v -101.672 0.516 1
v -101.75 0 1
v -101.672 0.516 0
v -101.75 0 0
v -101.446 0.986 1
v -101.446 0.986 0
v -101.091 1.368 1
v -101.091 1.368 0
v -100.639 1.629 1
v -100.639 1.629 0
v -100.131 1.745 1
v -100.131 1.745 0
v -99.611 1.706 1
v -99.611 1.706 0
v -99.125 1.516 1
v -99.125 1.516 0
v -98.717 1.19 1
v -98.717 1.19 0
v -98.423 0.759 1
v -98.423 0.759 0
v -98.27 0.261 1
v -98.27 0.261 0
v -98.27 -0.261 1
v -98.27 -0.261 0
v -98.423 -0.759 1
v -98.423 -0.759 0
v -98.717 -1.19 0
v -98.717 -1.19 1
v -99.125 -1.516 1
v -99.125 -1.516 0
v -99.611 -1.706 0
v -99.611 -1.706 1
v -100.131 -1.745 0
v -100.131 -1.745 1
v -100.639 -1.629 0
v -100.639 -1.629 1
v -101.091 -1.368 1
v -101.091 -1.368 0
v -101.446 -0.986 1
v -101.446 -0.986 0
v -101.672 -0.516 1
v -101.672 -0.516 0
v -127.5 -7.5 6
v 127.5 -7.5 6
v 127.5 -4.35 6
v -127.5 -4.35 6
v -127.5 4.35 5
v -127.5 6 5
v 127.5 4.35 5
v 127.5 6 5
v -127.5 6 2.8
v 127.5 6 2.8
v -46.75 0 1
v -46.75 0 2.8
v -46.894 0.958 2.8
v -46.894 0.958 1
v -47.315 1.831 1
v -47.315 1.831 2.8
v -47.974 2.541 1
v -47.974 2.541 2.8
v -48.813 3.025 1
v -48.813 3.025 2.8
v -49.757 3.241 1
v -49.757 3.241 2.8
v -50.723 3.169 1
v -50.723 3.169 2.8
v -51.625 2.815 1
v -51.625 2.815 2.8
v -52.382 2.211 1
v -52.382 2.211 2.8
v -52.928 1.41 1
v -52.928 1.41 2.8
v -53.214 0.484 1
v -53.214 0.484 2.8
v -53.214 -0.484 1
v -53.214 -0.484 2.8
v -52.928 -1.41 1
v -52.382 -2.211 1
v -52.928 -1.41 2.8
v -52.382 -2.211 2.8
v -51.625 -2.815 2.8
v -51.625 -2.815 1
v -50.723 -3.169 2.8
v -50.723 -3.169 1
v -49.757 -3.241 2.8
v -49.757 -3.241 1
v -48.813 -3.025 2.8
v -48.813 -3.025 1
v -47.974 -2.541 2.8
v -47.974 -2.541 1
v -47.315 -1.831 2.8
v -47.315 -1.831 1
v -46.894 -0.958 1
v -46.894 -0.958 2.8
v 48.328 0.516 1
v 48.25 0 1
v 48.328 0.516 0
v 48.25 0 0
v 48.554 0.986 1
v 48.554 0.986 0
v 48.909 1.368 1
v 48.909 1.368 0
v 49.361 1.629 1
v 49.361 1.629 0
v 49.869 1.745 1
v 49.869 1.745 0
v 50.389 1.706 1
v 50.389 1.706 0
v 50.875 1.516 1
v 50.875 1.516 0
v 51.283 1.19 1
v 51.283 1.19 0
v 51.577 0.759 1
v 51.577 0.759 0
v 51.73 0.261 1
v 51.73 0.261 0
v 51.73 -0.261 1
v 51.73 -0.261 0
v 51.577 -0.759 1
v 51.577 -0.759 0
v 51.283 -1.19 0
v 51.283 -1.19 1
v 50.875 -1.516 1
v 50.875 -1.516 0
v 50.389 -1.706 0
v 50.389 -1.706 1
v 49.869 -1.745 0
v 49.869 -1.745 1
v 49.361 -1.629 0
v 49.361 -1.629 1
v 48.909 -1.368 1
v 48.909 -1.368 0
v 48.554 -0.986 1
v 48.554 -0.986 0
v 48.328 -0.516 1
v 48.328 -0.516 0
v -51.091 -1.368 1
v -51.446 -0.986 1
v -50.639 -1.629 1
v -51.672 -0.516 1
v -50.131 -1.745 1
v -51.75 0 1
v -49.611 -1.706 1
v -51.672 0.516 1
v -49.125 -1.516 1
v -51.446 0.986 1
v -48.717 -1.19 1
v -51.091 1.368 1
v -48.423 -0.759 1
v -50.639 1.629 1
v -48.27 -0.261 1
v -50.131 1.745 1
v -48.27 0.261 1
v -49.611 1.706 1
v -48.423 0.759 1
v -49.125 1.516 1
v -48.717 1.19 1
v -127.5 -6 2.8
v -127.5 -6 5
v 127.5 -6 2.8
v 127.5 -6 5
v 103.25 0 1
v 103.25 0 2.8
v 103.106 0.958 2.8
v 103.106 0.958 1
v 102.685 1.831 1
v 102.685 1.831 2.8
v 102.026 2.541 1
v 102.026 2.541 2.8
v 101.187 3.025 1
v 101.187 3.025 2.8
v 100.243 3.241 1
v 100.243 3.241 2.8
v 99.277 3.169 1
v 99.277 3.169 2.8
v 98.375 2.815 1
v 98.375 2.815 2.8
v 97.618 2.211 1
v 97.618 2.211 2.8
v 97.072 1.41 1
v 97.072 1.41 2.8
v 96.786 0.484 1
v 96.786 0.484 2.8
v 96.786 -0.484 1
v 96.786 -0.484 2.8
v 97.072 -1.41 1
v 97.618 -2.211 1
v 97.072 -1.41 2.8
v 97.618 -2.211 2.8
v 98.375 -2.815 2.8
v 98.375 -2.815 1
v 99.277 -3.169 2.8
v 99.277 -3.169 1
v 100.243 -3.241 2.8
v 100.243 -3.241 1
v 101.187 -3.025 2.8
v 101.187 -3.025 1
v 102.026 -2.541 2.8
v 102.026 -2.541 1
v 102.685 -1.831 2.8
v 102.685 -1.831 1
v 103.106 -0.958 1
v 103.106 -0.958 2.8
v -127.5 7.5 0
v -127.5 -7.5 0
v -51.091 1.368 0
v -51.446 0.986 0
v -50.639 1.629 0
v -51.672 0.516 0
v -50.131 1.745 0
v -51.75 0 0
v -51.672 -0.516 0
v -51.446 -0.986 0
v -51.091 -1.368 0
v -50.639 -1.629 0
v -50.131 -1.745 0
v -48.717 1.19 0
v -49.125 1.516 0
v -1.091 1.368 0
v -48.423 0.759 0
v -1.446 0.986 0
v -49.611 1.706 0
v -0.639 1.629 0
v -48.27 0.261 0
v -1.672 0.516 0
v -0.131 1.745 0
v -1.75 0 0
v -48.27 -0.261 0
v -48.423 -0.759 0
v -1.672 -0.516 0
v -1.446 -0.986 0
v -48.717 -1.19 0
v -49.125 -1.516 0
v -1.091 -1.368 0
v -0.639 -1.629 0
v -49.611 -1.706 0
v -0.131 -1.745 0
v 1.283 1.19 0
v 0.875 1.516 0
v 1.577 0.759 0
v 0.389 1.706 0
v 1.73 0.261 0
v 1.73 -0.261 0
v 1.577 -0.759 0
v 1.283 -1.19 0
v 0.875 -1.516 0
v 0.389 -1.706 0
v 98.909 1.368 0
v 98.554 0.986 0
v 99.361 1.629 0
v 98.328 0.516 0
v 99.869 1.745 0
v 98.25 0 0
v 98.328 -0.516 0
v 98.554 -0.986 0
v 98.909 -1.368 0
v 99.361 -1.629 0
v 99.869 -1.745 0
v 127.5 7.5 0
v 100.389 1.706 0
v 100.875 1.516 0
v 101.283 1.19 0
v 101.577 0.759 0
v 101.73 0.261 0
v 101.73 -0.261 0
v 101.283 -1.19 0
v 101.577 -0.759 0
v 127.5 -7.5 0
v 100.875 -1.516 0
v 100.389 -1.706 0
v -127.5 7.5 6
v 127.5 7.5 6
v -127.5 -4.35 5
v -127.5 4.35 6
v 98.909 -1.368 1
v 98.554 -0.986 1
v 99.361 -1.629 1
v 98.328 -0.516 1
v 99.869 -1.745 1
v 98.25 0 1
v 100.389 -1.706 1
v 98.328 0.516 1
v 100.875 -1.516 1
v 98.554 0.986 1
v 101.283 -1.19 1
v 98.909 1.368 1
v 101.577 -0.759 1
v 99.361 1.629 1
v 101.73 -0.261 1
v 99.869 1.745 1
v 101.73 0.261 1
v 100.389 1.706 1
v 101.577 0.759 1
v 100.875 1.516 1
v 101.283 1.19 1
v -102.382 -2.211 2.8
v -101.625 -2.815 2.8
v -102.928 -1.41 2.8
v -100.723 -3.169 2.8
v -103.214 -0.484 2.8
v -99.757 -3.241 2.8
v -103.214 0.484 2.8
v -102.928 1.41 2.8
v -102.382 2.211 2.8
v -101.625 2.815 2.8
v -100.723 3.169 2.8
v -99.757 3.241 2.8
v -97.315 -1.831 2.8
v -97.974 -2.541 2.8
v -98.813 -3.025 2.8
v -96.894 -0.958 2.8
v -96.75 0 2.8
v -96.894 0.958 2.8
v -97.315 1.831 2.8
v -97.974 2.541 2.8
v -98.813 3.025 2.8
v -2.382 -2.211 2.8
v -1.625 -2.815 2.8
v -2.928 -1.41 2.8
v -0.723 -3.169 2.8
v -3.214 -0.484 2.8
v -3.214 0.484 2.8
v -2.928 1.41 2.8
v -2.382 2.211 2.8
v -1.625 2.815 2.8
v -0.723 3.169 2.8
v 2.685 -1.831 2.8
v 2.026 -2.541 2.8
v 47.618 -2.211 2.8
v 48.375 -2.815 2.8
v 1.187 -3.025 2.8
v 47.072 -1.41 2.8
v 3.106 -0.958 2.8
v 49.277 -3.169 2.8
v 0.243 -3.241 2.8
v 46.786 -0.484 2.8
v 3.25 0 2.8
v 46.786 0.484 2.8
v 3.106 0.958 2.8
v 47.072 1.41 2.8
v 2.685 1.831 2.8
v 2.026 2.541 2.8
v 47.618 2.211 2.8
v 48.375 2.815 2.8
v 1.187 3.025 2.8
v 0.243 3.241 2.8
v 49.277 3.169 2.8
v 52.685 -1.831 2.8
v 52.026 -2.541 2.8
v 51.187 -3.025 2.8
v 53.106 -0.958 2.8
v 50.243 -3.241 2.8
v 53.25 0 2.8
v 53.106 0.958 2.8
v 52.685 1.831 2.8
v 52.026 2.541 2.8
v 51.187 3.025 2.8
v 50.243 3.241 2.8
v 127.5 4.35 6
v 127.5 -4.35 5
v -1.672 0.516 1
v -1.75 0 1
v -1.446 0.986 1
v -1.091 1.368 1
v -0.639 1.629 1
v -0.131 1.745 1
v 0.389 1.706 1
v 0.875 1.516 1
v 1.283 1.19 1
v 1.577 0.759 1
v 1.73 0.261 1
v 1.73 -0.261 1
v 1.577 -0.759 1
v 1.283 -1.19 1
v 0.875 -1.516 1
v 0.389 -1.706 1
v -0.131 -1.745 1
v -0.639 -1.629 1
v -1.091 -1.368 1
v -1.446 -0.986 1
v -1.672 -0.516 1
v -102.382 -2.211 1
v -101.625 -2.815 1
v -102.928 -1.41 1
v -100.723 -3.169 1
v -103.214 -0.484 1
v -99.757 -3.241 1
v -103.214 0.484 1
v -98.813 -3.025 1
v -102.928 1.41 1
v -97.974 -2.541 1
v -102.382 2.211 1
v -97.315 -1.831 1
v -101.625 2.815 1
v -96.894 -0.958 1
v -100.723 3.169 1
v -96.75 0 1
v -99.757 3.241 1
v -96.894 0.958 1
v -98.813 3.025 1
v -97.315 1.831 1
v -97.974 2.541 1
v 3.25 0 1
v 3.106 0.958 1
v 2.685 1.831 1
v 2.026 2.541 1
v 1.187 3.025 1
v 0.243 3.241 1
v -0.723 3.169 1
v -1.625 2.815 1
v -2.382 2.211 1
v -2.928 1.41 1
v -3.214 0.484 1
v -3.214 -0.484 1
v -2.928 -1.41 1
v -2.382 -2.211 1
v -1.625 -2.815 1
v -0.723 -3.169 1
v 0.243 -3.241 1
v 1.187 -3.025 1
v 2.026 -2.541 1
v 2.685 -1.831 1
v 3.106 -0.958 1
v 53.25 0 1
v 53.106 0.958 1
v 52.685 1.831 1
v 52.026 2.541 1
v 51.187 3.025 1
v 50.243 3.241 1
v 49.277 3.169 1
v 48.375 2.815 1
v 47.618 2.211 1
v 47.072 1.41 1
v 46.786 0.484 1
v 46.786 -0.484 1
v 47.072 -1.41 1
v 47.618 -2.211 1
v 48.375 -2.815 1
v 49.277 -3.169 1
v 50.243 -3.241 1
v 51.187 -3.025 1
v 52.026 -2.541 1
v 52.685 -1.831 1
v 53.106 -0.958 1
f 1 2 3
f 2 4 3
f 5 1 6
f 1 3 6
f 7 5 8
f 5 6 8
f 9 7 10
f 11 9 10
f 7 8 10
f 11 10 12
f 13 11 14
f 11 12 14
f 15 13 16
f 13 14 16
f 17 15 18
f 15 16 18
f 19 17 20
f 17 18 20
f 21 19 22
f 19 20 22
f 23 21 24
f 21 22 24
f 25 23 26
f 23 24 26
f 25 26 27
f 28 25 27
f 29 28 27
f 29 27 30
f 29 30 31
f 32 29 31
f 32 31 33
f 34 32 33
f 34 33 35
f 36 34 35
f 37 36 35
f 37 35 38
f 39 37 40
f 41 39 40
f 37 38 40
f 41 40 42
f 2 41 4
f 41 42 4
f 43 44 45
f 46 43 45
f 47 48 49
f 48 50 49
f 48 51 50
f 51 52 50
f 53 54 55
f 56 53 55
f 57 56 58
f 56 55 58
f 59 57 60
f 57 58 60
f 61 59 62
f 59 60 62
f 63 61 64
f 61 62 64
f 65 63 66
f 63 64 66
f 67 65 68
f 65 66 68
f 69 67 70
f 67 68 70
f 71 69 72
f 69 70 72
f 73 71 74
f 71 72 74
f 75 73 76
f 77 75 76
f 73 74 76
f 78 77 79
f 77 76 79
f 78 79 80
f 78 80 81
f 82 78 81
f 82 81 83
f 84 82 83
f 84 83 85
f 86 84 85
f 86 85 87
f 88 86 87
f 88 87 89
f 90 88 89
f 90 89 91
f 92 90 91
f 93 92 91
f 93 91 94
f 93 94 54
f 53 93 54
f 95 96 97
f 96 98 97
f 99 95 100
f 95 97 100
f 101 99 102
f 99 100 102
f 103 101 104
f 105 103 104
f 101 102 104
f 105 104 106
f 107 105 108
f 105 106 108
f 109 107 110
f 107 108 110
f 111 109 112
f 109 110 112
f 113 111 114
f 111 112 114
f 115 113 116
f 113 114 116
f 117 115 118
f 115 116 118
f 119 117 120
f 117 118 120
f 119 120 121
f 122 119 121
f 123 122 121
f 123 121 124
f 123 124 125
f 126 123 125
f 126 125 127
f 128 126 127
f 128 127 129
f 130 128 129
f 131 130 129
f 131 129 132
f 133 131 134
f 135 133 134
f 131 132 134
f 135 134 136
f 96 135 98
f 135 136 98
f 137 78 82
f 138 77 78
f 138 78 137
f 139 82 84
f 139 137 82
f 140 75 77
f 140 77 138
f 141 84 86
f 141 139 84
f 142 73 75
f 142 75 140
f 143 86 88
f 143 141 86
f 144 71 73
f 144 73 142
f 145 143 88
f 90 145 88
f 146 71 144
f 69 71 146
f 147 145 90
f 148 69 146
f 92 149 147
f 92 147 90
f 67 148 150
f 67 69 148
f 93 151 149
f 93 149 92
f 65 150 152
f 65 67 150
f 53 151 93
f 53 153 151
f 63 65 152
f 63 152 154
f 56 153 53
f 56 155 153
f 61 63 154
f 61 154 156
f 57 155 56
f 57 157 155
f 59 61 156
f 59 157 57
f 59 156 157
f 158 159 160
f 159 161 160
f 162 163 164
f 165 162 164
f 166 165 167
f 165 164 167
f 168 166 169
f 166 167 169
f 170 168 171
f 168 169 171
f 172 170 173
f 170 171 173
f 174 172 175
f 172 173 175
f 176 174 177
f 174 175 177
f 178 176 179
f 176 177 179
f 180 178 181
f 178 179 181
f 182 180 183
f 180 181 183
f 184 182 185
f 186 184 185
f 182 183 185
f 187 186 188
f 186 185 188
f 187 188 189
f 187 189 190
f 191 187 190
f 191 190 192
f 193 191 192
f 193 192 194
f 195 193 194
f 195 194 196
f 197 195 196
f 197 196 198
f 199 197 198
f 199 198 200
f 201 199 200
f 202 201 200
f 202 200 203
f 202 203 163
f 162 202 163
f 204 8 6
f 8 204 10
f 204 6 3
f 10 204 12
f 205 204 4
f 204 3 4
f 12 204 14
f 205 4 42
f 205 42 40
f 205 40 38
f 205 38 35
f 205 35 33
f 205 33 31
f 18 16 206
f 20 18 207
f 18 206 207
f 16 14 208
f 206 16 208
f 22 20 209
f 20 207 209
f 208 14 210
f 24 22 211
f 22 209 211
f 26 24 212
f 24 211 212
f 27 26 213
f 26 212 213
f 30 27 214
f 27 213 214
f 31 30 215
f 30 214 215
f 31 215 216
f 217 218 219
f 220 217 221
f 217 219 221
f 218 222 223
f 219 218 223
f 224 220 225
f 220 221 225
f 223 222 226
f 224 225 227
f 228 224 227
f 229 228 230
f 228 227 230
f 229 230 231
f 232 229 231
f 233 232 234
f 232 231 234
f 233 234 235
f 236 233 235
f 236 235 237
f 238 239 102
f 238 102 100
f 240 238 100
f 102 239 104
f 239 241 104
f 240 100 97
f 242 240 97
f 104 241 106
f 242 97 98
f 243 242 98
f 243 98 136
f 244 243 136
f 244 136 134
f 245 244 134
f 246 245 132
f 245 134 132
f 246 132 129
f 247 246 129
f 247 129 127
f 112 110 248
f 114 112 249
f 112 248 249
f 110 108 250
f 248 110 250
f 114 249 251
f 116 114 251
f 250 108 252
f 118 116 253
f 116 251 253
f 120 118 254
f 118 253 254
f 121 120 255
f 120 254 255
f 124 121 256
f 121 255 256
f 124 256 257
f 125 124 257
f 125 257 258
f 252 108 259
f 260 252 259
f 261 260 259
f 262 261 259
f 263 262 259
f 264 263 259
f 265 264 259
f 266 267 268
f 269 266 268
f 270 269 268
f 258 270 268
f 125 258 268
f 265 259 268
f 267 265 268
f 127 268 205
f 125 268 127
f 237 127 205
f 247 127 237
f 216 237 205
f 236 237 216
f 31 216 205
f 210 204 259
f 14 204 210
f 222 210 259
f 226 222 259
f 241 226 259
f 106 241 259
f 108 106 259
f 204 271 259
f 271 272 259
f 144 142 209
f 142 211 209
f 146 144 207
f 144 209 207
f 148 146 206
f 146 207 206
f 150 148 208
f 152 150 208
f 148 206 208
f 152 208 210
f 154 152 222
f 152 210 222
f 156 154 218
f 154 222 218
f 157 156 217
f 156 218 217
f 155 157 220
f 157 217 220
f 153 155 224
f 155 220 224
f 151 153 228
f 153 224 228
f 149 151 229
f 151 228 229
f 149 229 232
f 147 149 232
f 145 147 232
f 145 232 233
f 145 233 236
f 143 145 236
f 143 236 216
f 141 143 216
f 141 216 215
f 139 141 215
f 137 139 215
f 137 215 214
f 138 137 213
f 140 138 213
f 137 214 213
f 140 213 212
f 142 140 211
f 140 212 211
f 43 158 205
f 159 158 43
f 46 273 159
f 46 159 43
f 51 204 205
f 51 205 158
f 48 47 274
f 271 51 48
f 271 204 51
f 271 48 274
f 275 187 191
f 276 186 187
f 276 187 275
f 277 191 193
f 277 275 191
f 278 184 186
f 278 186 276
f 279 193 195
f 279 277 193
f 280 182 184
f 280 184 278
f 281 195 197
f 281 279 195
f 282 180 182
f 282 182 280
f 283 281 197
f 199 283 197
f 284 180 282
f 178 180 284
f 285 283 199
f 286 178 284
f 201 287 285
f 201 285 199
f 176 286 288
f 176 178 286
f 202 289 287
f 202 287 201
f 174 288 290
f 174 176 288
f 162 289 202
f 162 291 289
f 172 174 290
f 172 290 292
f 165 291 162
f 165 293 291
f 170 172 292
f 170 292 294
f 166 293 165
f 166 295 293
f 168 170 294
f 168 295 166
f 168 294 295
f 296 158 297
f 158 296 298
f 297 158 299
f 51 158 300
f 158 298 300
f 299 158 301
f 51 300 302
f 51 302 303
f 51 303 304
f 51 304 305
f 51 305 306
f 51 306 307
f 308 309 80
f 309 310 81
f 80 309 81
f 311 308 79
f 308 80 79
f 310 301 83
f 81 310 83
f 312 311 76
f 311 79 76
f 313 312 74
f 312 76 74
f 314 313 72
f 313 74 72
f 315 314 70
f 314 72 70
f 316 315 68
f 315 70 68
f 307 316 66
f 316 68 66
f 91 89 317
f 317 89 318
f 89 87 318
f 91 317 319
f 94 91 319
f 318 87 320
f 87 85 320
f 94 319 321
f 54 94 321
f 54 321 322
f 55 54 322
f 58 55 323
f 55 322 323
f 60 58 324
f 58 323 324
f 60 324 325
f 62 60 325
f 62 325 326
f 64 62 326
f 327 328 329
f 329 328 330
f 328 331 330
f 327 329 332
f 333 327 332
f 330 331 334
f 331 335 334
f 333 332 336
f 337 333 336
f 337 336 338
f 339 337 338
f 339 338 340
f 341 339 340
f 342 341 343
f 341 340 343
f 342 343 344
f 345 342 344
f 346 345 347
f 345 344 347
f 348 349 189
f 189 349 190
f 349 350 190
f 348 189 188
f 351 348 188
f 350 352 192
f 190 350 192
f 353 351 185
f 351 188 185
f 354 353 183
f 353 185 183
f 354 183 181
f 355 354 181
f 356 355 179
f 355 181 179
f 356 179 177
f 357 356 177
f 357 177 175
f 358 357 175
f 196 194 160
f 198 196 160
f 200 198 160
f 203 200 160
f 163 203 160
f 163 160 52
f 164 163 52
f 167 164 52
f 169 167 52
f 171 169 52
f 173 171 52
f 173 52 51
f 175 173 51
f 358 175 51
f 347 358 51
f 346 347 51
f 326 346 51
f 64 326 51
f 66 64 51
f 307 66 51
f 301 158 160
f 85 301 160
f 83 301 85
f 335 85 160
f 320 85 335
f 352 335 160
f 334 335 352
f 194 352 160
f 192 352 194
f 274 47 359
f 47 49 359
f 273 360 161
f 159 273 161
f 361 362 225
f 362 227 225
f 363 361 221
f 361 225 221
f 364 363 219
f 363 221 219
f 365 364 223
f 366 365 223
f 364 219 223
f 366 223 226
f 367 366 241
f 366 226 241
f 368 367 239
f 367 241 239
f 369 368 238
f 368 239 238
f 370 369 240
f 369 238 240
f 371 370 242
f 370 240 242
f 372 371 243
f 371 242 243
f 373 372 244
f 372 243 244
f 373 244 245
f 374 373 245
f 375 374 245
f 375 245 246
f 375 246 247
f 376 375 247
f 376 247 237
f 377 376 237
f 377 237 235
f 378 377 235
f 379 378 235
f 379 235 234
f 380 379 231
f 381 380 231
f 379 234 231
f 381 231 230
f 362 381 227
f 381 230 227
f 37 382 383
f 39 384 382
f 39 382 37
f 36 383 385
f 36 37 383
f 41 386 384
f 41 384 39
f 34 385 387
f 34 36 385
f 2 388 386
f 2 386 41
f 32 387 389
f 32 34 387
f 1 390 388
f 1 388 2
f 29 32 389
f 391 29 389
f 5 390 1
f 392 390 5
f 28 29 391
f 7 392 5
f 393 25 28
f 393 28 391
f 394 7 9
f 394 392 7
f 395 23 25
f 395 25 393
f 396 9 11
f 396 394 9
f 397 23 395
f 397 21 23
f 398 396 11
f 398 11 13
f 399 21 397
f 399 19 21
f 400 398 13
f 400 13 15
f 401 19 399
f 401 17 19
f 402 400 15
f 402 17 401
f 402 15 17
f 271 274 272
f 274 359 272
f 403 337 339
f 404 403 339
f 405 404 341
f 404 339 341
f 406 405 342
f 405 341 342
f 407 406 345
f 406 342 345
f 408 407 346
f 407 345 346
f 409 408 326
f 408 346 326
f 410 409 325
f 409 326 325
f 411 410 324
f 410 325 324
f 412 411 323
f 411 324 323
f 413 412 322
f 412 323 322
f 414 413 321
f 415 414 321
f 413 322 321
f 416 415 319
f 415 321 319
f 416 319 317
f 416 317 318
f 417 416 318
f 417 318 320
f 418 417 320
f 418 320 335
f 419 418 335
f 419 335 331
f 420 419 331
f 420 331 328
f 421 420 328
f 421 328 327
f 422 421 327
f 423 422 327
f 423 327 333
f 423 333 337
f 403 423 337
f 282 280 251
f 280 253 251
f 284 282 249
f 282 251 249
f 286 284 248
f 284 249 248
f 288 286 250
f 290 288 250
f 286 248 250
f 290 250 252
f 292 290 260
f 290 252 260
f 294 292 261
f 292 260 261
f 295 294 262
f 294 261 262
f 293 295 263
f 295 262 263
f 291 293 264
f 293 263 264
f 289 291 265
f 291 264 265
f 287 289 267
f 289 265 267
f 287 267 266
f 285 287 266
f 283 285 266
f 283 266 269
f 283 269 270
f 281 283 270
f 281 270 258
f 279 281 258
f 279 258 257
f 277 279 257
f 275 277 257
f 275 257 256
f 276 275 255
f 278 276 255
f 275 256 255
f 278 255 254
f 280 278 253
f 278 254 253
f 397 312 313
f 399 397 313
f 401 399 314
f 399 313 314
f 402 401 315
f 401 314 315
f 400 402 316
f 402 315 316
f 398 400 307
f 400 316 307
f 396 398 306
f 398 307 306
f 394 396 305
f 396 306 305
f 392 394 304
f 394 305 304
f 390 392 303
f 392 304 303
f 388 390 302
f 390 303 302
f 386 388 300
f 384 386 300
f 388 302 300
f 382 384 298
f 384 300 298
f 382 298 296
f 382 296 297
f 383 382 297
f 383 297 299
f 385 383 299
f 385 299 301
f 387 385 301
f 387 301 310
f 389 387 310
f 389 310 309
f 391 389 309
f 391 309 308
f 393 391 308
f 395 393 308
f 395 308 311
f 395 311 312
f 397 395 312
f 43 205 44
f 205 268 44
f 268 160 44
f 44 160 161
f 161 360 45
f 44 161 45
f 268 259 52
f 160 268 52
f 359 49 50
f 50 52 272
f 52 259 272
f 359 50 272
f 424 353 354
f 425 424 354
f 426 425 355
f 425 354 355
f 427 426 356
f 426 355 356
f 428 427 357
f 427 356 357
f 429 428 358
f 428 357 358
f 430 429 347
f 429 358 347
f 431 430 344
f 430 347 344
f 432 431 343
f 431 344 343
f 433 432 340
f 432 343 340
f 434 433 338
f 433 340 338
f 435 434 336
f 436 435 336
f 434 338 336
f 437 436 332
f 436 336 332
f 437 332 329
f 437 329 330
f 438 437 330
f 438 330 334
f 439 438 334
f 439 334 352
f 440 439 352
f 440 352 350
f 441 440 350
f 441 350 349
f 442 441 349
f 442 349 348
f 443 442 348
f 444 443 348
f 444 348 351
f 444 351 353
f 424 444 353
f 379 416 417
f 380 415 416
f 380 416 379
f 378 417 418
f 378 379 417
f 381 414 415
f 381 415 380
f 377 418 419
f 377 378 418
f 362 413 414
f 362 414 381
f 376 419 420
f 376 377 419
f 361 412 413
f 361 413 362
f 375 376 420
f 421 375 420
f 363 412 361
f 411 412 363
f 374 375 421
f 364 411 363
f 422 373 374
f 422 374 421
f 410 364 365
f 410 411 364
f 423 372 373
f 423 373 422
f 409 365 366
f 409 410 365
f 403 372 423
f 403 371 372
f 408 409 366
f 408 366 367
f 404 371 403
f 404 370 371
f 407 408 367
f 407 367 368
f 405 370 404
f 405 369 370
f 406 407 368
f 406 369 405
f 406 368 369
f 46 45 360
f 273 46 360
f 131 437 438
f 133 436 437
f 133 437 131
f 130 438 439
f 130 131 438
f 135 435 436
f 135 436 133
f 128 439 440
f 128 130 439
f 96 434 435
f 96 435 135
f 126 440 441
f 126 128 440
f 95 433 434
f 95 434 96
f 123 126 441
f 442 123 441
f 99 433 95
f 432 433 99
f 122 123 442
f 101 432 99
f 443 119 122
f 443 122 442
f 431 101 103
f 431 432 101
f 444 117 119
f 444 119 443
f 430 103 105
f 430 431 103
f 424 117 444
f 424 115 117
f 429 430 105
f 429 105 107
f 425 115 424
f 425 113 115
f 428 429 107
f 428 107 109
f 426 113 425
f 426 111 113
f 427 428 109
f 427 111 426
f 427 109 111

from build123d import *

# Parameters (mm, degrees)
EXTRUDE_1_DEPTH           = 127.5
HOLE_WIZARD_1_D           = 3.5
HOLE_WIZARD_1_CBORE_D     = 6.5
HOLE_WIZARD_1_CBORE_DEPTH = 1.8


with BuildPart() as part:
    # 草图1 → 凸台-拉伸1 (new, symmetric)
    with BuildSketch(Plane(origin=(0, 0, 0), x_dir=(0, 0, -1), z_dir=(1, 0, 0))):
        Polygon((-5, -4.35), (-5, -6), (-2.8, -6), (-2.8, 6), (-5, 6), (-5, 4.35), (-6, 4.35), (-6, 7.5), (0, 7.5), (0, -7.5), (-6, -7.5), (-6, -4.35), align=None)
    extrude(amount=EXTRUDE_1_DEPTH, both=True)

    # 孔1 (through all)
    with Locations(Plane.XY.offset(2.8)):
        with Locations((-100, 0), (-50, 0), (0, 0), (50, 0), (100, 0)):
            CounterBoreHole(HOLE_WIZARD_1_D / 2, HOLE_WIZARD_1_CBORE_D / 2, HOLE_WIZARD_1_CBORE_DEPTH)


solid = part.part
